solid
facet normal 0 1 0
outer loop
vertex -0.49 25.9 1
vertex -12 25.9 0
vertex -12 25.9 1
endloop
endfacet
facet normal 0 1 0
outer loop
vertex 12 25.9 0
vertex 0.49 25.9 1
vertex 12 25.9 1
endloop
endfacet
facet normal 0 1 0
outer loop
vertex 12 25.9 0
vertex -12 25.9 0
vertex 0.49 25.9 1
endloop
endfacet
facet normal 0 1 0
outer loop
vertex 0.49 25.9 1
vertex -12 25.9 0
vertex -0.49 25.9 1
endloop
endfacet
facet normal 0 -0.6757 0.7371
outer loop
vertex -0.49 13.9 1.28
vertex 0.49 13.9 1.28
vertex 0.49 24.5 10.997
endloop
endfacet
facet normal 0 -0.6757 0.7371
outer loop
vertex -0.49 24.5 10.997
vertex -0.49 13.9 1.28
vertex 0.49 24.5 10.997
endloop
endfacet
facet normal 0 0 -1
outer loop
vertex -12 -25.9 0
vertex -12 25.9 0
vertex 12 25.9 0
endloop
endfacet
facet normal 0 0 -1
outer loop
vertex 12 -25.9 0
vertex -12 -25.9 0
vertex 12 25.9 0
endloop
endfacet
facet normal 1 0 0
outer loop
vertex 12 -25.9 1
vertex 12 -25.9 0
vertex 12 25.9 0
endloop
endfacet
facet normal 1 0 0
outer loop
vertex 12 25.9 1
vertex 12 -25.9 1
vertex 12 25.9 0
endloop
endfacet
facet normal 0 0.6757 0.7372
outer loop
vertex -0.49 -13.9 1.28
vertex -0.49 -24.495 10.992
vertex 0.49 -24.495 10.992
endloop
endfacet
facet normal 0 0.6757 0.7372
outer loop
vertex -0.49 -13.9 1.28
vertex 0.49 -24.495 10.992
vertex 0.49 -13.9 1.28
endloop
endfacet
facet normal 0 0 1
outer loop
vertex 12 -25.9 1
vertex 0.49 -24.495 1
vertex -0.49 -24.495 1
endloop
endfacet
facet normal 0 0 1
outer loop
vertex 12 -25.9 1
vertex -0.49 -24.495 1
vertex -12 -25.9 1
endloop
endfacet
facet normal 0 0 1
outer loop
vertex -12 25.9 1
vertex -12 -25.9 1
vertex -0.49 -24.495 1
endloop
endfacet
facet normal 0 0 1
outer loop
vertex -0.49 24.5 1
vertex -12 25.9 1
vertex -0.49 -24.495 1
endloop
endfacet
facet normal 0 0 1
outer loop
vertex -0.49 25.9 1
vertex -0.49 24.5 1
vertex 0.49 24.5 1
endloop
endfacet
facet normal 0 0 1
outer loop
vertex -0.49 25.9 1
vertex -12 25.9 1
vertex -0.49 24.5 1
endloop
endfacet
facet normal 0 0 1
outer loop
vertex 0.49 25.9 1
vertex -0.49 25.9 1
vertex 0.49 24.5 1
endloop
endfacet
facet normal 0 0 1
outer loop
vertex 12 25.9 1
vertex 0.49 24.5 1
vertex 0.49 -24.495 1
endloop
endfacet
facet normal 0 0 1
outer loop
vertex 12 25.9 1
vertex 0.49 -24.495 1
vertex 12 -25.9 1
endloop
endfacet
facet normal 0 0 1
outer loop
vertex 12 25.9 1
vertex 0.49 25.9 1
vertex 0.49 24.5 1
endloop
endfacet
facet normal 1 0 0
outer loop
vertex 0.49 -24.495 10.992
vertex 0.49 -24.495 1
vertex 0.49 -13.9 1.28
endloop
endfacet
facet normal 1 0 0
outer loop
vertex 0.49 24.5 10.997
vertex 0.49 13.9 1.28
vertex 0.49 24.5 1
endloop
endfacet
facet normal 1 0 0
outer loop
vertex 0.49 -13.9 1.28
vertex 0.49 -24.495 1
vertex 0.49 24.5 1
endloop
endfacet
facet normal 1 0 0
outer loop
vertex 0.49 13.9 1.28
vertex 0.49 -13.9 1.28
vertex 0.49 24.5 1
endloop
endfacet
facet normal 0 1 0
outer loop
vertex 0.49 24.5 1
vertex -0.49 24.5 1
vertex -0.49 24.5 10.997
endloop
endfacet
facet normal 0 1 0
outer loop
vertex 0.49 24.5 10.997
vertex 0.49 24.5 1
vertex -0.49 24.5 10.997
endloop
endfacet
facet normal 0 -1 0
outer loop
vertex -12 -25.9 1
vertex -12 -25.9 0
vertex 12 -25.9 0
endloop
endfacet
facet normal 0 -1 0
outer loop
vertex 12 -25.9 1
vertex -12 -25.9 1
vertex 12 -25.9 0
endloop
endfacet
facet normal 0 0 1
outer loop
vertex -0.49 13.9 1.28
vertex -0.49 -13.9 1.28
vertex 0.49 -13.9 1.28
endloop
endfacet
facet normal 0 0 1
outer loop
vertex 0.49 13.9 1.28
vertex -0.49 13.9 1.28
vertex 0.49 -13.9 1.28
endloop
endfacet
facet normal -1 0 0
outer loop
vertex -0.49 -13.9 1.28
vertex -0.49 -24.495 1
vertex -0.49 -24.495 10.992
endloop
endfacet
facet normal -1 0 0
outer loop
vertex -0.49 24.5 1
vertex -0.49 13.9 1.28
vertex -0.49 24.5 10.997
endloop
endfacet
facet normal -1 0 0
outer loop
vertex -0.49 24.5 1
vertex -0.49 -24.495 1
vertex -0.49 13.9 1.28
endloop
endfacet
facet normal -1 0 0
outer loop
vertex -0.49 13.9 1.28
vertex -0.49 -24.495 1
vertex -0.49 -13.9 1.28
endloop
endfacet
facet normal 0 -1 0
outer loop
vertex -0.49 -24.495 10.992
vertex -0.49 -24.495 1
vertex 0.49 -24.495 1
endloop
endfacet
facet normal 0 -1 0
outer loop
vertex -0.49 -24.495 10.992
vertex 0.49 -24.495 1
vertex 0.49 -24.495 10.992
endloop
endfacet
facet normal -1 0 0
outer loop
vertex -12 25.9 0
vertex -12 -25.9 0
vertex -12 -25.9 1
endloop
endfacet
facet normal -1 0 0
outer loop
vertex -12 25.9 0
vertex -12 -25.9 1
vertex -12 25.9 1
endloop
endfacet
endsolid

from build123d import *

# Parameters (mm, degrees)
SKICA1_W                 = 24
SKICA1_H                 = 51.8
P_IDAT_VYSUNUT_M2_DEPTH  = 1
SKICA2_W                 = 0.980102229
SKICA2_H                 = 51.8
P_IDAT_VYSUNUT_M3_DEPTH  = 0.28
SKICA3_W                 = 0.980102229
SKICA3_H                 = 12
P_IDAT_VYSUNUT_M5_DEPTH  = 11
ODEBRAT_VYSUNUT_M2_DEPTH = 11
ODEBRAT_VYSUNUT_M3_DEPTH = 11
SKICA9_W                 = 12.041997339
SKICA9_H                 = 1.4
ODEBRAT_VYSUNUT_M4_DEPTH = 11
SKICA10_W                = 11.638115032
SKICA10_H                = 1.404604082
ODEBRAT_VYSUNUT_M5_DEPTH = 11


with BuildPart() as part:
    # Skica1 → Přidat vysunutím2 (new body)
    with BuildSketch(Plane.XY):
        Rectangle(SKICA1_W, SKICA1_H)
    extrude(amount=P_IDAT_VYSUNUT_M2_DEPTH)

    # Skica2 → Přidat vysunutím3 (add)
    with BuildSketch(Plane.XY.offset(1)):
        with Locations((5.1115e-05, 0)):
            Rectangle(SKICA2_W, SKICA2_H)
    extrude(amount=P_IDAT_VYSUNUT_M3_DEPTH)

    # Skica3 → Přidat vysunutím5 (add)
    with BuildSketch(Plane.XY.offset(1.28)):
        with Locations((5.1115e-05, 19.9)):
            Rectangle(SKICA3_W, SKICA3_H)
        with Locations((5.1115e-05, -19.9)):
            Rectangle(SKICA3_W, SKICA3_H)
    extrude(amount=P_IDAT_VYSUNUT_M5_DEPTH)

    # Skica6 → Odebrat vysunutím2 (cut)
    with BuildSketch(Plane(origin=(0.490102229, 0, 0), x_dir=(0, 0, -1), z_dir=(1, 0, 0))):
        Polygon((-12.28, 25.9), (-12.28, 13.9), (-1.28, 13.9), align=None)
    extrude(amount=-ODEBRAT_VYSUNUT_M2_DEPTH, mode=Mode.SUBTRACT)

    # Skica7 → Odebrat vysunutím3 (cut)
    with BuildSketch(Plane.ZY.offset(0.49)):
        Polygon((12.28, -13.9), (12.28, -25.9), (1.28, -13.9), align=None)
    extrude(amount=-ODEBRAT_VYSUNUT_M3_DEPTH, mode=Mode.SUBTRACT)

    # Skica9 → Odebrat vysunutím4 (cut)
    with BuildSketch(Plane.ZY.offset(0.49)):
        with Locations((7.02099867, 25.2)):
            Rectangle(SKICA9_W, SKICA9_H)
    extrude(amount=-ODEBRAT_VYSUNUT_M4_DEPTH, mode=Mode.SUBTRACT)

    # Skica10 → Odebrat vysunutím5 (cut)
    with BuildSketch(Plane.ZY.offset(0.49)):
        with Locations((6.819057516, -25.197697959)):
            Rectangle(SKICA10_W, SKICA10_H)
    extrude(amount=-ODEBRAT_VYSUNUT_M5_DEPTH, mode=Mode.SUBTRACT)


solid = part.part
